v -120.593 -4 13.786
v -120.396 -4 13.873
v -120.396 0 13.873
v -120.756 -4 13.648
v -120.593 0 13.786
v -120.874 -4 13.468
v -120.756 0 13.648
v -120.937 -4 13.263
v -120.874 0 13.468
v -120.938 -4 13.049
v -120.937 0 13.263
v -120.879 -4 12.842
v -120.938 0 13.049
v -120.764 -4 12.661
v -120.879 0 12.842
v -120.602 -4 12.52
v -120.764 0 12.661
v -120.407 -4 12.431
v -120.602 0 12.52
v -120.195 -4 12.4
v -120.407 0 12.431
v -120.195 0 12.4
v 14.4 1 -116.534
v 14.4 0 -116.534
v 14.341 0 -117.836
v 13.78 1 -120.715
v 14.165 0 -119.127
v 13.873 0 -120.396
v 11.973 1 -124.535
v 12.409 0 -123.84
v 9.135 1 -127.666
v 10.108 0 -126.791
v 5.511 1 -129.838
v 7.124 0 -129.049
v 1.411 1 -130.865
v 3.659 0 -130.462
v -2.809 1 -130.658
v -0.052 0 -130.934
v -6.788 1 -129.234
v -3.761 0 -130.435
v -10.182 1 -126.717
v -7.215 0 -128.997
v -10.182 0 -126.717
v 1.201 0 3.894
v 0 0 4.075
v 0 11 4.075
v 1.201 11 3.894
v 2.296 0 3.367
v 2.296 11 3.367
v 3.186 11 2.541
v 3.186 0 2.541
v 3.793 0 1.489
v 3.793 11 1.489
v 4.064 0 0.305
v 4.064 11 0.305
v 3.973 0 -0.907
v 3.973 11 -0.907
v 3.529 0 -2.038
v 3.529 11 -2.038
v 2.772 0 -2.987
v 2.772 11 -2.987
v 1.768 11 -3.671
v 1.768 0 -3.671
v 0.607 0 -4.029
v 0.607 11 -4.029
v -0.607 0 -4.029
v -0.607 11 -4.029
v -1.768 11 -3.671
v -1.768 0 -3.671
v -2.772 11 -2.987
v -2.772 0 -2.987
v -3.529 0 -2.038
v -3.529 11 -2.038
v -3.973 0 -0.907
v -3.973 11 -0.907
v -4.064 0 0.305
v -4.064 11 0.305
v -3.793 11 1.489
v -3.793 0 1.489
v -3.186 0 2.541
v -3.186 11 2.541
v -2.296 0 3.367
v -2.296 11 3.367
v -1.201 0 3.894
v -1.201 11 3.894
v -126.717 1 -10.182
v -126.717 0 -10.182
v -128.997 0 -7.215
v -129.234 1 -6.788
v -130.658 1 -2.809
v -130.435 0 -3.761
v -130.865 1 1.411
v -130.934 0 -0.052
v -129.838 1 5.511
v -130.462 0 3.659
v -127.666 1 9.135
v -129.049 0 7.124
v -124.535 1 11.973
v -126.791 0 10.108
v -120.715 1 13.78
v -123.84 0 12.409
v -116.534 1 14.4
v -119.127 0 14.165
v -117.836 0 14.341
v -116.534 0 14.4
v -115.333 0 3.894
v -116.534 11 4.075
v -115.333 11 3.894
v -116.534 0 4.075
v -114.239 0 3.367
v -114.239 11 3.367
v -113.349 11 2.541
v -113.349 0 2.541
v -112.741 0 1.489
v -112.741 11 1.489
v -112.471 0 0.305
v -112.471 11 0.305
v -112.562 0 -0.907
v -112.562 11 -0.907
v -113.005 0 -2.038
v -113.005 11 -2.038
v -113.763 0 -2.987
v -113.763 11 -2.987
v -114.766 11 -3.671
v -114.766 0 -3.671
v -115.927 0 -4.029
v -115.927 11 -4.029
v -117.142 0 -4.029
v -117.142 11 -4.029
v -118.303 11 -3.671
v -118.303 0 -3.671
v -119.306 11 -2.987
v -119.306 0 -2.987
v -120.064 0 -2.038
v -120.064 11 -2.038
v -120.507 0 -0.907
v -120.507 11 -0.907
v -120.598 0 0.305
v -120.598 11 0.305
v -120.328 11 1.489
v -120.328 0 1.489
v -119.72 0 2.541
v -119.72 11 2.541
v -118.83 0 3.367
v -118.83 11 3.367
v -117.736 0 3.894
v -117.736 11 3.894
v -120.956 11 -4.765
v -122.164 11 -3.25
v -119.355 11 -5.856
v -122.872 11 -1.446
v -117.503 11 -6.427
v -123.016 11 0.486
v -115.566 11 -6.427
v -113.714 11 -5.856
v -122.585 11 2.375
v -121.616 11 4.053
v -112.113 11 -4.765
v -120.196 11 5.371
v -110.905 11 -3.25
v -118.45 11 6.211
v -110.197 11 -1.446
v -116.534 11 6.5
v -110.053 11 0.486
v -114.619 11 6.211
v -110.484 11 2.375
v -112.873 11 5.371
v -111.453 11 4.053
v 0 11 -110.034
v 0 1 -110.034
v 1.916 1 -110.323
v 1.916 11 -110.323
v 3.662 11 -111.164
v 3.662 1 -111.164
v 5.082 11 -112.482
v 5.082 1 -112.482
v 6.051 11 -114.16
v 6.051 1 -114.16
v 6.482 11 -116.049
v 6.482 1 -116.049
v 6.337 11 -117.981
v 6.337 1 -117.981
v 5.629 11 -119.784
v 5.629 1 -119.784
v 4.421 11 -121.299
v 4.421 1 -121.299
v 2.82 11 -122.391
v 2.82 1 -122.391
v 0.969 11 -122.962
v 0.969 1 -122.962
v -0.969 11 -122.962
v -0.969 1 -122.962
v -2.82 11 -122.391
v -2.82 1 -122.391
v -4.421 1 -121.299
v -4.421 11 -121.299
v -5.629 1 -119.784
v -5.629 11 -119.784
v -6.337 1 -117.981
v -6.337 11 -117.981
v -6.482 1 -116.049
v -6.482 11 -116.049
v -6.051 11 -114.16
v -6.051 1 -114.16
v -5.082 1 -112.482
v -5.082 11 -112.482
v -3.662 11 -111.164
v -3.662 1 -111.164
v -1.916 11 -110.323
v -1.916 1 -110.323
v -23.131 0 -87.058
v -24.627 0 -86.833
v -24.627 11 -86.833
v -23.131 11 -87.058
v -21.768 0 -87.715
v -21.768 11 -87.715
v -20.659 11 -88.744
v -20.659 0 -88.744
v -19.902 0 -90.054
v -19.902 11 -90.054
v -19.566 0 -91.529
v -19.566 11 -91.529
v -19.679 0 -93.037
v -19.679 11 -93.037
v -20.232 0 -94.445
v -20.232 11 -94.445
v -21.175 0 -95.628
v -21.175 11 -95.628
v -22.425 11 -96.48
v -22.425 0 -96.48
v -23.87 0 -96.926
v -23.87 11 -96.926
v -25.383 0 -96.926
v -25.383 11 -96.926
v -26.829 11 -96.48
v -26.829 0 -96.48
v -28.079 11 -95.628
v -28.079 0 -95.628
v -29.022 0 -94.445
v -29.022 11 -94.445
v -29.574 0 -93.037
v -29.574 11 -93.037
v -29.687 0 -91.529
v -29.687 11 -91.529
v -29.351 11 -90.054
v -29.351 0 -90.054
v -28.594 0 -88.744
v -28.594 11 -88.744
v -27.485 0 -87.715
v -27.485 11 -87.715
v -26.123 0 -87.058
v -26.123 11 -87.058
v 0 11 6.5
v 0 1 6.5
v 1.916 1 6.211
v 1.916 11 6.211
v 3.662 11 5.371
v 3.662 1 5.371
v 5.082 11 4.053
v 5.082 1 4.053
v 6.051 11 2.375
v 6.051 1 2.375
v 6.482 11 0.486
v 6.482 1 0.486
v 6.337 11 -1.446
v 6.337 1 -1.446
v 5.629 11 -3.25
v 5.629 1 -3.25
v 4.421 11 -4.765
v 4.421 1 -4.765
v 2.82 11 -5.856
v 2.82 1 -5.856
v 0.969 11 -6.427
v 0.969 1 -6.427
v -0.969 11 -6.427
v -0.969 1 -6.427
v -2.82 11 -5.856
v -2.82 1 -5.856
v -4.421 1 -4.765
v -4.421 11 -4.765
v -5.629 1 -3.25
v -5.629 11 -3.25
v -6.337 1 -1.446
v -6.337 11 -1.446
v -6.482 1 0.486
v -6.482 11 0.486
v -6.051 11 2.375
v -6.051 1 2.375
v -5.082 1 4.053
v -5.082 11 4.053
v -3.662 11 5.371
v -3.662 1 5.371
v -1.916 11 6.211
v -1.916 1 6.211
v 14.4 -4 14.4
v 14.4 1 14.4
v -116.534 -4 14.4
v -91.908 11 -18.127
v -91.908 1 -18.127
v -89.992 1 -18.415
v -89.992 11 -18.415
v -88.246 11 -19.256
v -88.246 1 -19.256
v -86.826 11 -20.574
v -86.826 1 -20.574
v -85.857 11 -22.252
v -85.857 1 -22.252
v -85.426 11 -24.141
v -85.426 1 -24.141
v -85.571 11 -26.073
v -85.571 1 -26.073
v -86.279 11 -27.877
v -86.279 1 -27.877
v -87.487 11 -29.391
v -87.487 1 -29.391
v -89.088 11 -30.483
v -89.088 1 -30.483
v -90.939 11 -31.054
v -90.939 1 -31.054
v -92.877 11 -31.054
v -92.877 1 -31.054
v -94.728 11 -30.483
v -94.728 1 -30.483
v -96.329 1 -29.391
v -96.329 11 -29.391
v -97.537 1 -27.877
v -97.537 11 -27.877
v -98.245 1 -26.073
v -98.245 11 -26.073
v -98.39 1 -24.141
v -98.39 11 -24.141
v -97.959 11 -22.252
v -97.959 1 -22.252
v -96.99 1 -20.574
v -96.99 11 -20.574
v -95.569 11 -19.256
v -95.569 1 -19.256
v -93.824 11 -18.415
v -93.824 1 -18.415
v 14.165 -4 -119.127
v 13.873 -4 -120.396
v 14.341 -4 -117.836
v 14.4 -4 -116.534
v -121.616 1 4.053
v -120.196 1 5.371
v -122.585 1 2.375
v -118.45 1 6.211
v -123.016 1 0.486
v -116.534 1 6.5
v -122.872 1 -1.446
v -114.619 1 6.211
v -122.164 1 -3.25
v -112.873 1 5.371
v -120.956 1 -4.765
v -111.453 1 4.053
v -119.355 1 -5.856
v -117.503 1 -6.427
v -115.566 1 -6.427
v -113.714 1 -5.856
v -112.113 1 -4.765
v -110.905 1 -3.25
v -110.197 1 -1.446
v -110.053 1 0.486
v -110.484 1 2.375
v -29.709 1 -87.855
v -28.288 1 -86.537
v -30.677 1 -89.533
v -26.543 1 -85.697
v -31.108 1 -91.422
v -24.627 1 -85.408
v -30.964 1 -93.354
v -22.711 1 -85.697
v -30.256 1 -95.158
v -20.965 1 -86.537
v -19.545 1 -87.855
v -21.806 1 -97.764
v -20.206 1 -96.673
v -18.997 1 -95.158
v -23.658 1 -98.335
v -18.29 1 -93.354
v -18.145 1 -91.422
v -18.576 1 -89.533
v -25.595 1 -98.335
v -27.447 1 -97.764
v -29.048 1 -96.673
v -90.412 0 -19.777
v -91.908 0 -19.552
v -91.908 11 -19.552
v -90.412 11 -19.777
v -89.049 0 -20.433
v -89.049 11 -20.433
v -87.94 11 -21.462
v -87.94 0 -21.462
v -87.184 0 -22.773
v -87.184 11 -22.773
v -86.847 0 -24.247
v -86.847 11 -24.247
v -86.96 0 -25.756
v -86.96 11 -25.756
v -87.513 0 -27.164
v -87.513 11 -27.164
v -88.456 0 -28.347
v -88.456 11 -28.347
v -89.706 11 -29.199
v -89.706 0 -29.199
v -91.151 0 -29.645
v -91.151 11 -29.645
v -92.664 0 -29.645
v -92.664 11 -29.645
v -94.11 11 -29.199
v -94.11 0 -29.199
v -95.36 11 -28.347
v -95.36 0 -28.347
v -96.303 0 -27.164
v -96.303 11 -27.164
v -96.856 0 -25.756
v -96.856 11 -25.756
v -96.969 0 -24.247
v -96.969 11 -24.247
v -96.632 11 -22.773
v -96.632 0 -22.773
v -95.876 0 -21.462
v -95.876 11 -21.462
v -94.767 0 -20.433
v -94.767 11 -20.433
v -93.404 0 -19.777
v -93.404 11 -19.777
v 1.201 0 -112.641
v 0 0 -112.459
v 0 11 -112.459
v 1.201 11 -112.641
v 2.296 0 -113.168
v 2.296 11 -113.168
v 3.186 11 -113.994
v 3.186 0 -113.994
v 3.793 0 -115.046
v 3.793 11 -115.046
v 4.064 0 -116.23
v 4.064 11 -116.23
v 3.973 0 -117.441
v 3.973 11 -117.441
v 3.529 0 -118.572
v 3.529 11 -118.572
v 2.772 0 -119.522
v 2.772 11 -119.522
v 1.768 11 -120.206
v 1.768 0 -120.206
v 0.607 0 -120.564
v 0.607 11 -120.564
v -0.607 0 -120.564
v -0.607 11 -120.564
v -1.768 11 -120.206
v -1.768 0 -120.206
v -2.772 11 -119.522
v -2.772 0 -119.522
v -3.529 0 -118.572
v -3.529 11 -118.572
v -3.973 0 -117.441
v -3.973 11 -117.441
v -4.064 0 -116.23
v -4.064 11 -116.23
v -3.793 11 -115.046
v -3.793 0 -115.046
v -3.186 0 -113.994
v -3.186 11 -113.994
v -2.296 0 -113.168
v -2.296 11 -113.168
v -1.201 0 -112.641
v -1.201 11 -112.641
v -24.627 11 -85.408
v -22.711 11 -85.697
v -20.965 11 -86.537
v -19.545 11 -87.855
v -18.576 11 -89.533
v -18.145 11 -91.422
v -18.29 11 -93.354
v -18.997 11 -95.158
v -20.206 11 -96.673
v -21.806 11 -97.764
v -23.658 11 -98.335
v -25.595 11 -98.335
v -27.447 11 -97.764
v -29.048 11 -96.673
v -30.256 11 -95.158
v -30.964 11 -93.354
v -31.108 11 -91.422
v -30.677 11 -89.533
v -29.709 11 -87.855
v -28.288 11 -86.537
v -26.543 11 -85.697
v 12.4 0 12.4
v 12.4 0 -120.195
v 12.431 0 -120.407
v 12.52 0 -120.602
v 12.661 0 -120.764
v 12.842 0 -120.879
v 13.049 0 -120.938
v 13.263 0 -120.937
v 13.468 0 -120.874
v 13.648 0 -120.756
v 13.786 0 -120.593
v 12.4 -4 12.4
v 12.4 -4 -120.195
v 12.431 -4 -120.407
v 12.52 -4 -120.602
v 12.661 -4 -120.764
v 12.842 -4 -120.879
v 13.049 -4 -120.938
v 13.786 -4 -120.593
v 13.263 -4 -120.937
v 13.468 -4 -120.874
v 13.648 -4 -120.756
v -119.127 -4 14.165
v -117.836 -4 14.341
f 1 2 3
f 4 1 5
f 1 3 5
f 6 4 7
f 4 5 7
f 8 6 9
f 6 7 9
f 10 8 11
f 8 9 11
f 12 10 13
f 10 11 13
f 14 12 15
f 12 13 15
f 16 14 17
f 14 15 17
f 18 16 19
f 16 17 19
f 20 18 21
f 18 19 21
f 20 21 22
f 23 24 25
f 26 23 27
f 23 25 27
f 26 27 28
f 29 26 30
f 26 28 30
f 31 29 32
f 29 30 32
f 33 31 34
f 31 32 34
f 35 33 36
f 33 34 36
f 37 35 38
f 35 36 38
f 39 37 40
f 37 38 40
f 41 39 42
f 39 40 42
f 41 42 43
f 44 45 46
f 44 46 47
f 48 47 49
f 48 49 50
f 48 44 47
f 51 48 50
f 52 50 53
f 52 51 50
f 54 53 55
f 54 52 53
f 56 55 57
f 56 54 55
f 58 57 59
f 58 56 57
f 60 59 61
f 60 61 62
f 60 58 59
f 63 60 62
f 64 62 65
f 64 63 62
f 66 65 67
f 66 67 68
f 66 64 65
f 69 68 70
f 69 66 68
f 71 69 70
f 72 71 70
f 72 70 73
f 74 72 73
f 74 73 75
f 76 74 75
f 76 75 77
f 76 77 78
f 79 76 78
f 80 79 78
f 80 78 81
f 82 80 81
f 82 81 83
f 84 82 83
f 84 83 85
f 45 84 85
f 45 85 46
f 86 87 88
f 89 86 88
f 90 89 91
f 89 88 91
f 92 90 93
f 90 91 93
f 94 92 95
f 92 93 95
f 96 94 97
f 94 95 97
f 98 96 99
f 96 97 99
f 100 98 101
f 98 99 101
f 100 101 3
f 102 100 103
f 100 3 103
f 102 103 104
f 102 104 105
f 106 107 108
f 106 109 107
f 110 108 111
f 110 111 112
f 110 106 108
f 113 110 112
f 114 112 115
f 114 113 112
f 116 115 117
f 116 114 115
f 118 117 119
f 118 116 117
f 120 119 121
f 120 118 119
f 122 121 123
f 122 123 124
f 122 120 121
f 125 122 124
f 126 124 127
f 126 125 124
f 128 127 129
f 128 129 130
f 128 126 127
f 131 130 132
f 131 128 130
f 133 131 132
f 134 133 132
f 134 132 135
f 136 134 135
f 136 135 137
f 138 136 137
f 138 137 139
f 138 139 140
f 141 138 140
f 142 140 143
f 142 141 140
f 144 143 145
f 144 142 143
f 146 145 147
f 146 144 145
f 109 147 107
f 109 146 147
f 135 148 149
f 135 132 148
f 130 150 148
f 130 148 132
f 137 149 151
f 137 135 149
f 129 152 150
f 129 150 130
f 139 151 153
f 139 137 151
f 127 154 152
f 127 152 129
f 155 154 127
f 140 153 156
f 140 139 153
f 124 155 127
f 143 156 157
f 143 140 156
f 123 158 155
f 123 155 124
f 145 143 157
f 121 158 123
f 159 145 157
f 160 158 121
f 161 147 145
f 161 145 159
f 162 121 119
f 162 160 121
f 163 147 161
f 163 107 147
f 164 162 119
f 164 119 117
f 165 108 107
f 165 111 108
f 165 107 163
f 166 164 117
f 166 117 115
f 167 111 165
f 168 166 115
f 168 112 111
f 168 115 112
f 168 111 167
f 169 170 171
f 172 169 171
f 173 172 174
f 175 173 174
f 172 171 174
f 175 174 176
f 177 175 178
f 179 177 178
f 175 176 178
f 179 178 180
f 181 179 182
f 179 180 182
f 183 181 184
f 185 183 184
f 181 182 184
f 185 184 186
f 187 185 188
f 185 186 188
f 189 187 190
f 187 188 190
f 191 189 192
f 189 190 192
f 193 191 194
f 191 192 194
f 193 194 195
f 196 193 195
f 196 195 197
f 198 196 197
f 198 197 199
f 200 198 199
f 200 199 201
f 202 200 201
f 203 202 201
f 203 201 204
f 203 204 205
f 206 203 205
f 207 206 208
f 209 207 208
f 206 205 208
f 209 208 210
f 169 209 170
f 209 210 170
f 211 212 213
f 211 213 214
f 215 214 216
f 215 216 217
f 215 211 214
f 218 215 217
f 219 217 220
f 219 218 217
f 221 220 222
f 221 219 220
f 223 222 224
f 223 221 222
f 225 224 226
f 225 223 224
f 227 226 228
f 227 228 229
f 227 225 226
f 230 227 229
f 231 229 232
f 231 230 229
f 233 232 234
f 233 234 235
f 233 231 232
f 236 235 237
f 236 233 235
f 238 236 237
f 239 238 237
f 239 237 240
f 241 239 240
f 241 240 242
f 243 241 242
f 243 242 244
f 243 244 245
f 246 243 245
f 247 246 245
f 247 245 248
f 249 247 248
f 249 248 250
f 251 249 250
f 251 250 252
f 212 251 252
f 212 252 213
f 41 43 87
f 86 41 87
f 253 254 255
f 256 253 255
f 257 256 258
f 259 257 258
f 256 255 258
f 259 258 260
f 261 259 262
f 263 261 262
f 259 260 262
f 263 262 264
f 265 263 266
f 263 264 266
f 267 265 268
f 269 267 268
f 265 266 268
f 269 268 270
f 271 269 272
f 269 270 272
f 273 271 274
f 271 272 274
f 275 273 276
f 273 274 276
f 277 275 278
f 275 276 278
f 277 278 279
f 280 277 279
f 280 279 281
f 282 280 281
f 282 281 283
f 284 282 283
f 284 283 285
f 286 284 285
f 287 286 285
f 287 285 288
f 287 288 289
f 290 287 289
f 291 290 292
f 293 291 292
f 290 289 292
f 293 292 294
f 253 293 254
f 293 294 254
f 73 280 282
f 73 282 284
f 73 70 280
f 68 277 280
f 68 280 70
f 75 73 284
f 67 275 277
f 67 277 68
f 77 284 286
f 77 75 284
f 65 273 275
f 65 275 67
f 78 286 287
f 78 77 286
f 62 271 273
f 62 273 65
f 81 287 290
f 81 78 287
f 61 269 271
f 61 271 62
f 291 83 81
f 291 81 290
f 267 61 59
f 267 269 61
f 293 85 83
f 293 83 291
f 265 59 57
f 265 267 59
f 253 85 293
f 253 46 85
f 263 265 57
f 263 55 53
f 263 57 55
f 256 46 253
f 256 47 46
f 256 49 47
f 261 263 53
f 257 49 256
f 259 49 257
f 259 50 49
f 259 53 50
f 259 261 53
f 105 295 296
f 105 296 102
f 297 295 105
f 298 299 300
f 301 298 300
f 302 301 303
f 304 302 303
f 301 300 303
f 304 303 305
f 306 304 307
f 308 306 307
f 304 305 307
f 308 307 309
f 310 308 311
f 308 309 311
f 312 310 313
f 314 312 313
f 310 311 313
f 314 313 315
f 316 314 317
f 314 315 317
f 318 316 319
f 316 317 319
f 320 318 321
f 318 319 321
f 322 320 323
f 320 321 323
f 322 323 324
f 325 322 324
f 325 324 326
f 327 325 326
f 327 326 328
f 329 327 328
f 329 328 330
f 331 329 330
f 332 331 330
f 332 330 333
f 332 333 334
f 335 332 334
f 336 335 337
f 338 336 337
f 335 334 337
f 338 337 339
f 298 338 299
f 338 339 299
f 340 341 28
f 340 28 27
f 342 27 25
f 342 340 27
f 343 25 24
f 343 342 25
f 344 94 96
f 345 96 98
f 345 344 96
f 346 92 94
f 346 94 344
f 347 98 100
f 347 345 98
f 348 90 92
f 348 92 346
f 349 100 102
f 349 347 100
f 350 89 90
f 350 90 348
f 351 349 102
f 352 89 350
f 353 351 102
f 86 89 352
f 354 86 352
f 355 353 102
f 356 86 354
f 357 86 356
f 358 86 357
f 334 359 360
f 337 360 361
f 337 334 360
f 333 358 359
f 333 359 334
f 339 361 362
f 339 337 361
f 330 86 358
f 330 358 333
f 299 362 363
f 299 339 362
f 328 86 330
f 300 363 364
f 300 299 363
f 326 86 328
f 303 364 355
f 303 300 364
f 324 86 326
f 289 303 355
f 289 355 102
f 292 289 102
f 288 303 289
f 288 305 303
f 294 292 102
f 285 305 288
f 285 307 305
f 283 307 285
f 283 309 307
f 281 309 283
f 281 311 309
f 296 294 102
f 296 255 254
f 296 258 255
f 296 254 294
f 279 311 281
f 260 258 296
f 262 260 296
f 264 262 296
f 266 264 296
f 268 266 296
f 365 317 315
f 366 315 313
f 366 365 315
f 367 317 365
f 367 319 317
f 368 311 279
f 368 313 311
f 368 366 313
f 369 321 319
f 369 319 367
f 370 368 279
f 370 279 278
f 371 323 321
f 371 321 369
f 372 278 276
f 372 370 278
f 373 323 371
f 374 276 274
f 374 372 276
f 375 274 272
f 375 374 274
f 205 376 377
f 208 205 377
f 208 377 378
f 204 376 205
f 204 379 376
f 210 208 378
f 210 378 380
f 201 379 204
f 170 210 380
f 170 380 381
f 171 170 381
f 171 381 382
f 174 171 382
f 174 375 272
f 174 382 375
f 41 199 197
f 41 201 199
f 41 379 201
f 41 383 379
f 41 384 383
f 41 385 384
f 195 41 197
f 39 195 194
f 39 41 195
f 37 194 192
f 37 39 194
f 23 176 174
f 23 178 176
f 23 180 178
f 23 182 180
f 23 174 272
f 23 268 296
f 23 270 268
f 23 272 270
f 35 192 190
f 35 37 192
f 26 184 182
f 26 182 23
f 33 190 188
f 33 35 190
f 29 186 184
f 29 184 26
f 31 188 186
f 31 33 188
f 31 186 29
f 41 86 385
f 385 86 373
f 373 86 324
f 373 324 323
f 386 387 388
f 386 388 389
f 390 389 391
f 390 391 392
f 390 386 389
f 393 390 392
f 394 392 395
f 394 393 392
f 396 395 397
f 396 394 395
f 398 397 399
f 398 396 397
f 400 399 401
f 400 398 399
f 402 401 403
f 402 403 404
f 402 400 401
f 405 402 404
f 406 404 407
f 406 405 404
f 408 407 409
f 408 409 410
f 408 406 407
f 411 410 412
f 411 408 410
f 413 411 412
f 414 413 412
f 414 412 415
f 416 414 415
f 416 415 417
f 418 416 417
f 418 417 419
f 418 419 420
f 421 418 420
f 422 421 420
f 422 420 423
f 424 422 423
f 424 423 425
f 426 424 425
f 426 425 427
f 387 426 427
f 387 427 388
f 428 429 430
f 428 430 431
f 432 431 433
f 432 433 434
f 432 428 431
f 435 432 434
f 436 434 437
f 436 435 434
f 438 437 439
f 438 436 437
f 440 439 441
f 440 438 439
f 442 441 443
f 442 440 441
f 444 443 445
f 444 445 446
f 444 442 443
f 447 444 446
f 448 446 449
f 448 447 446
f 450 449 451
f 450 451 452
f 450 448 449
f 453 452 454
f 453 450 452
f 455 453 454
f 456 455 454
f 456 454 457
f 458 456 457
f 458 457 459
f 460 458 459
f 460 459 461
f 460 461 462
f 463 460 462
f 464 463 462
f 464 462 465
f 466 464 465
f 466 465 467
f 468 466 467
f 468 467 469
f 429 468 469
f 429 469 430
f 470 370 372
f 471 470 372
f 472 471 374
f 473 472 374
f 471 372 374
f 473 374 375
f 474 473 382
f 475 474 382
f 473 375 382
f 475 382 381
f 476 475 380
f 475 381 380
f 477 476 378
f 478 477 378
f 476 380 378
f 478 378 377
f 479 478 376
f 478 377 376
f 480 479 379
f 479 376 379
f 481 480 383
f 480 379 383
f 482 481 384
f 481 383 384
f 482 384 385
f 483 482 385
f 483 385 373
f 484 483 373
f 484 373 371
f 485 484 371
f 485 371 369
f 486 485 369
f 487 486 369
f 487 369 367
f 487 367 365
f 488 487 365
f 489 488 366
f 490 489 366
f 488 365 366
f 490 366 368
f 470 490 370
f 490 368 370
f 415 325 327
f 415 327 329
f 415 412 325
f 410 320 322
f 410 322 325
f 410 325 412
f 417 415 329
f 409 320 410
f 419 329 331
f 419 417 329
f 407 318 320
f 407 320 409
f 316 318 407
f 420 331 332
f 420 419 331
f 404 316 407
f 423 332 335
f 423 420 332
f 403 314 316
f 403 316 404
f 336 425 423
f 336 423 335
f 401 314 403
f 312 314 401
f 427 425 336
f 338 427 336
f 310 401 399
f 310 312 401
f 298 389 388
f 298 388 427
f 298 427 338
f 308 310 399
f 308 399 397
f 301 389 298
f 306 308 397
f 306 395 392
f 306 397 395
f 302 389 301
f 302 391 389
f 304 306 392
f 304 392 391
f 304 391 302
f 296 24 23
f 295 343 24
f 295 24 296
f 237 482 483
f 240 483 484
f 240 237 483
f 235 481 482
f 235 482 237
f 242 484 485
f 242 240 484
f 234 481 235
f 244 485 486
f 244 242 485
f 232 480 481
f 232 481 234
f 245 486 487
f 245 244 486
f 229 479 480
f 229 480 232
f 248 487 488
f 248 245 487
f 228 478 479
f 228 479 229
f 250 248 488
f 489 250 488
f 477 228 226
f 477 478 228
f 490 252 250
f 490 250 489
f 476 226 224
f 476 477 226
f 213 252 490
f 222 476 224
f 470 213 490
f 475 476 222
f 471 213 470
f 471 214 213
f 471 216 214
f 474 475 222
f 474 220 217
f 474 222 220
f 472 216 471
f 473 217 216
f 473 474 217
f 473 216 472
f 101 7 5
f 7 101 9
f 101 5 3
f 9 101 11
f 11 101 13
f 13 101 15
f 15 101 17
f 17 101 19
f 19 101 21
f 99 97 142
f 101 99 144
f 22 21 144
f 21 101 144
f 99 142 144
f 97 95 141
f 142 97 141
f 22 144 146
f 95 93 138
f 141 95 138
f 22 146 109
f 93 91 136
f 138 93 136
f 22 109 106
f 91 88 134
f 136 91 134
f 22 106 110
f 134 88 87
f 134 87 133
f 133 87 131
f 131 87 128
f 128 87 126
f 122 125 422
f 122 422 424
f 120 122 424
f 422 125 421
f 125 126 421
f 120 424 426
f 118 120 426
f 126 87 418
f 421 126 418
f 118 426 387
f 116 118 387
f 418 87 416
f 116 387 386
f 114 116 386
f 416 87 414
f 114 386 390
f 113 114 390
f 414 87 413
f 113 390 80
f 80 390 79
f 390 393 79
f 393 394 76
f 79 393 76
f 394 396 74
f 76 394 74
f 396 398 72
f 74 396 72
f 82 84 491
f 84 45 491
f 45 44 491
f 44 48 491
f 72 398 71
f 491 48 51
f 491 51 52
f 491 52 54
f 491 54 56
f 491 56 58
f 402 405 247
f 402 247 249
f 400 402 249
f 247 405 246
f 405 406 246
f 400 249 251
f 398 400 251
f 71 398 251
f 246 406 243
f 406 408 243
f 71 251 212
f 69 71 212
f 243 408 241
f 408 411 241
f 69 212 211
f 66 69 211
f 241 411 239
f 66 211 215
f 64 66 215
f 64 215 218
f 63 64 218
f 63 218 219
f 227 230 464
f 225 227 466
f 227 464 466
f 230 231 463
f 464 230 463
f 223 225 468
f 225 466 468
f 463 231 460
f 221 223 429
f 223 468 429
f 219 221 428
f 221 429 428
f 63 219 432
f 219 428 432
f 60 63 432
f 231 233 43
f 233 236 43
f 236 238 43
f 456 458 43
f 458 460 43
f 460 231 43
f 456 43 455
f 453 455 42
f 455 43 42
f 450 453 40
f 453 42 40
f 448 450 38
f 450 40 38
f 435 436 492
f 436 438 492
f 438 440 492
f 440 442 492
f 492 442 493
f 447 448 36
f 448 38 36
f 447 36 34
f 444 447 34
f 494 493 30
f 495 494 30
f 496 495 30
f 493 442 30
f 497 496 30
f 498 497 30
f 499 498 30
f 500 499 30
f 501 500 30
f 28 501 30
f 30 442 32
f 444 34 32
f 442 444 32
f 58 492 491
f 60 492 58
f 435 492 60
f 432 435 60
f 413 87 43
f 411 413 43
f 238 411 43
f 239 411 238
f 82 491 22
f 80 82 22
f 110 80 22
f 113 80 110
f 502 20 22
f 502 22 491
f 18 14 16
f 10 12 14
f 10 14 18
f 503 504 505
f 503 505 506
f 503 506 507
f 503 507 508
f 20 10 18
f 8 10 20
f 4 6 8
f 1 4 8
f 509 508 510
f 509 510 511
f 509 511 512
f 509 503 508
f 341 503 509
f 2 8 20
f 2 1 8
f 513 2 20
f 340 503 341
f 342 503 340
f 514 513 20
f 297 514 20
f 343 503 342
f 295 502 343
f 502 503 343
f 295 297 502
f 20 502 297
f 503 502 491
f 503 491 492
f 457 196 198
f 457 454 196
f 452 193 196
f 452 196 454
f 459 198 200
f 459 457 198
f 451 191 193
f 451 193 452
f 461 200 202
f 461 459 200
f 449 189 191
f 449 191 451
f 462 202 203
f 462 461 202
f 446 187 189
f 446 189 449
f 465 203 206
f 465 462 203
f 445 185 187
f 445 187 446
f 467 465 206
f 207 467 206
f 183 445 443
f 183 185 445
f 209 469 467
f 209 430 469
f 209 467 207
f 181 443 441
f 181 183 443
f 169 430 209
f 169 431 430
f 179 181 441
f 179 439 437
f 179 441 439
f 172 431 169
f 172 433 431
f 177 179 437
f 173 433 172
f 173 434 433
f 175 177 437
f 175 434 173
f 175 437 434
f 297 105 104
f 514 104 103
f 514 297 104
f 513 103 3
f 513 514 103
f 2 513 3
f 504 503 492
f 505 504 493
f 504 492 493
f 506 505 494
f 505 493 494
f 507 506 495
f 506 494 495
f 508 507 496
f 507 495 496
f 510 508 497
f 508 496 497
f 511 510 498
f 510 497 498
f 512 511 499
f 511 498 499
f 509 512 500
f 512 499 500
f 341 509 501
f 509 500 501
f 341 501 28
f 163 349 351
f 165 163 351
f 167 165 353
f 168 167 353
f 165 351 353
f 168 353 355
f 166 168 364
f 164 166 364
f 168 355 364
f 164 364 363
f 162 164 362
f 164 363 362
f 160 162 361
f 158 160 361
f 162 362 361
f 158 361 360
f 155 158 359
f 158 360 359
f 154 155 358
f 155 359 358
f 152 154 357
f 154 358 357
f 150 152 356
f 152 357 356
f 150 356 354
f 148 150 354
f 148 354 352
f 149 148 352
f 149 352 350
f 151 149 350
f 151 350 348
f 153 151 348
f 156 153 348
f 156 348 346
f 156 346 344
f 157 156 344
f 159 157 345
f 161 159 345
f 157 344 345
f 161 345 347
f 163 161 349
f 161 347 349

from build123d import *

# Parameters (mm, degrees)
SKETCH1_R           = 4.075
SKETCH1_R_2         = 5.075
BOSS_EXTRUDE1_DEPTH = 1
BOSS_EXTRUDE3_START = 4
BOSS_EXTRUDE3_DEPTH = 4
FILLET2_R           = 0.75
SKETCH4_R           = 6.5
SKETCH4_R_2         = 4.075
SKETCH4_R_3         = 5.075
BOSS_EXTRUDE4_DEPTH = 10


with BuildPart() as part:
    # Sketch1 → Boss-Extrude1 (new body)
    with BuildSketch(Plane(origin=(0, 0, 0), x_dir=(1, 0, 0), z_dir=(0, 1, 0))):
        with BuildLine():
            Line((14.4, -14.4), (14.4, 116.534474513))
            ThreePointArc((14.4, 116.534474513), (5.510641426, 129.838339781), (-10.182337649, 126.716812162))
            Line((-10.182337649, 126.716812162), (-126.716812162, 10.182337649))
            ThreePointArc((-126.716812162, 10.182337649), (-129.838339781, -5.510641426), (-116.534474513, -14.4))
            Line((-116.534474513, -14.4), (14.4, -14.4))
        make_face()
        with Locations(Location((-116.534474513, 0, 0), (0, 0, 270))):
            Circle(SKETCH1_R, mode=Mode.SUBTRACT)
        with Locations(Location((0, 116.534474513, 0), (0, 0, 270))):
            Circle(SKETCH1_R, mode=Mode.SUBTRACT)
        with Locations(Location((0, 0, 0), (0, 0, 270))):
            Circle(SKETCH1_R, mode=Mode.SUBTRACT)
        with Locations(Location((-91.907842371, 24.626632142, 0), (0, 0, 270))):
            Circle(SKETCH1_R_2, mode=Mode.SUBTRACT)
        with Locations(Location((-24.626632142, 91.907842371, 0), (0, 0, 270))):
            Circle(SKETCH1_R_2, mode=Mode.SUBTRACT)
    extrude(amount=BOSS_EXTRUDE1_DEPTH)

    # Sketch3 → Boss-Extrude3 (add)
    with BuildSketch(Plane.XZ.offset(BOSS_EXTRUDE3_START)):
        with BuildLine():
            Line((12.4, 12.4), (12.4, -123.8556766))
            ThreePointArc((12.4, -123.8556766), (13.891004283, -120.329207705), (14.4, -116.534474513))
            Line((14.4, -116.534474513), (14.4, 14.4))
            Line((14.4, 14.4), (-116.534474513, 14.4))
            ThreePointArc((-116.534474513, 14.4), (-120.329207705, 13.891004283), (-123.8556766, 12.4))
            Line((-123.8556766, 12.4), (12.4, 12.4))
        make_face()
    extrude(amount=-BOSS_EXTRUDE3_DEPTH)

    # Fillet2
    fillet2_edges = [part.edges().sort_by_distance(p)[0] for p in [
        (-123.8556766, -2, 12.4),
        (12.4, -2, -123.8556766),
    ]]
    fillet(fillet2_edges, radius=FILLET2_R)

    # Sketch4 → Boss-Extrude4 (add)
    # profile 1 of 5: a face of its own
    with BuildSketch(Plane(origin=(0, 1, 0), x_dir=(1, 0, 0), z_dir=(0, 1, 0))):
        with Locations(Location((-116.534474513, 0, 0), (0, 0, 270))):
            Circle(SKETCH4_R)
        with Locations(Location((-116.534474513, 0, 0), (0, 0, 270))):
            Circle(SKETCH4_R_2, mode=Mode.SUBTRACT)
    # profile 2 of 5: a face of its own
    with BuildSketch(Plane(origin=(0, 1, 0), x_dir=(1, 0, 0), z_dir=(0, 1, 0))):
        with Locations(Location((0, 116.534474513, 0), (0, 0, 270))):
            Circle(SKETCH4_R)
        with Locations(Location((0, 116.534474513, 0), (0, 0, 270))):
            Circle(SKETCH4_R_2, mode=Mode.SUBTRACT)
    # profile 3 of 5: a face of its own
    with BuildSketch(Plane(origin=(0, 1, 0), x_dir=(1, 0, 0), z_dir=(0, 1, 0))):
        with Locations(Location((-91.907842371, 24.626632142, 0), (0, 0, 270))):
            Circle(SKETCH4_R)
        with Locations(Location((-91.907842371, 24.626632142, 0), (0, 0, 270))):
            Circle(SKETCH4_R_3, mode=Mode.SUBTRACT)
    # profile 4 of 5: a face of its own
    with BuildSketch(Plane(origin=(0, 1, 0), x_dir=(1, 0, 0), z_dir=(0, 1, 0))):
        with Locations(Location((-24.626632142, 91.907842371, 0), (0, 0, 270))):
            Circle(SKETCH4_R)
        with Locations(Location((-24.626632142, 91.907842371, 0), (0, 0, 270))):
            Circle(SKETCH4_R_3, mode=Mode.SUBTRACT)
    # profile 5 of 5: a face of its own
    with BuildSketch(Plane(origin=(0, 1, 0), x_dir=(1, 0, 0), z_dir=(0, 1, 0))):
        with Locations(Location((0, 0, 0), (0, 0, 270))):
            Circle(SKETCH4_R)
        with Locations(Location((0, 0, 0), (0, 0, 270))):
            Circle(SKETCH4_R_2, mode=Mode.SUBTRACT)
    extrude(amount=BOSS_EXTRUDE4_DEPTH)


solid = part.part
